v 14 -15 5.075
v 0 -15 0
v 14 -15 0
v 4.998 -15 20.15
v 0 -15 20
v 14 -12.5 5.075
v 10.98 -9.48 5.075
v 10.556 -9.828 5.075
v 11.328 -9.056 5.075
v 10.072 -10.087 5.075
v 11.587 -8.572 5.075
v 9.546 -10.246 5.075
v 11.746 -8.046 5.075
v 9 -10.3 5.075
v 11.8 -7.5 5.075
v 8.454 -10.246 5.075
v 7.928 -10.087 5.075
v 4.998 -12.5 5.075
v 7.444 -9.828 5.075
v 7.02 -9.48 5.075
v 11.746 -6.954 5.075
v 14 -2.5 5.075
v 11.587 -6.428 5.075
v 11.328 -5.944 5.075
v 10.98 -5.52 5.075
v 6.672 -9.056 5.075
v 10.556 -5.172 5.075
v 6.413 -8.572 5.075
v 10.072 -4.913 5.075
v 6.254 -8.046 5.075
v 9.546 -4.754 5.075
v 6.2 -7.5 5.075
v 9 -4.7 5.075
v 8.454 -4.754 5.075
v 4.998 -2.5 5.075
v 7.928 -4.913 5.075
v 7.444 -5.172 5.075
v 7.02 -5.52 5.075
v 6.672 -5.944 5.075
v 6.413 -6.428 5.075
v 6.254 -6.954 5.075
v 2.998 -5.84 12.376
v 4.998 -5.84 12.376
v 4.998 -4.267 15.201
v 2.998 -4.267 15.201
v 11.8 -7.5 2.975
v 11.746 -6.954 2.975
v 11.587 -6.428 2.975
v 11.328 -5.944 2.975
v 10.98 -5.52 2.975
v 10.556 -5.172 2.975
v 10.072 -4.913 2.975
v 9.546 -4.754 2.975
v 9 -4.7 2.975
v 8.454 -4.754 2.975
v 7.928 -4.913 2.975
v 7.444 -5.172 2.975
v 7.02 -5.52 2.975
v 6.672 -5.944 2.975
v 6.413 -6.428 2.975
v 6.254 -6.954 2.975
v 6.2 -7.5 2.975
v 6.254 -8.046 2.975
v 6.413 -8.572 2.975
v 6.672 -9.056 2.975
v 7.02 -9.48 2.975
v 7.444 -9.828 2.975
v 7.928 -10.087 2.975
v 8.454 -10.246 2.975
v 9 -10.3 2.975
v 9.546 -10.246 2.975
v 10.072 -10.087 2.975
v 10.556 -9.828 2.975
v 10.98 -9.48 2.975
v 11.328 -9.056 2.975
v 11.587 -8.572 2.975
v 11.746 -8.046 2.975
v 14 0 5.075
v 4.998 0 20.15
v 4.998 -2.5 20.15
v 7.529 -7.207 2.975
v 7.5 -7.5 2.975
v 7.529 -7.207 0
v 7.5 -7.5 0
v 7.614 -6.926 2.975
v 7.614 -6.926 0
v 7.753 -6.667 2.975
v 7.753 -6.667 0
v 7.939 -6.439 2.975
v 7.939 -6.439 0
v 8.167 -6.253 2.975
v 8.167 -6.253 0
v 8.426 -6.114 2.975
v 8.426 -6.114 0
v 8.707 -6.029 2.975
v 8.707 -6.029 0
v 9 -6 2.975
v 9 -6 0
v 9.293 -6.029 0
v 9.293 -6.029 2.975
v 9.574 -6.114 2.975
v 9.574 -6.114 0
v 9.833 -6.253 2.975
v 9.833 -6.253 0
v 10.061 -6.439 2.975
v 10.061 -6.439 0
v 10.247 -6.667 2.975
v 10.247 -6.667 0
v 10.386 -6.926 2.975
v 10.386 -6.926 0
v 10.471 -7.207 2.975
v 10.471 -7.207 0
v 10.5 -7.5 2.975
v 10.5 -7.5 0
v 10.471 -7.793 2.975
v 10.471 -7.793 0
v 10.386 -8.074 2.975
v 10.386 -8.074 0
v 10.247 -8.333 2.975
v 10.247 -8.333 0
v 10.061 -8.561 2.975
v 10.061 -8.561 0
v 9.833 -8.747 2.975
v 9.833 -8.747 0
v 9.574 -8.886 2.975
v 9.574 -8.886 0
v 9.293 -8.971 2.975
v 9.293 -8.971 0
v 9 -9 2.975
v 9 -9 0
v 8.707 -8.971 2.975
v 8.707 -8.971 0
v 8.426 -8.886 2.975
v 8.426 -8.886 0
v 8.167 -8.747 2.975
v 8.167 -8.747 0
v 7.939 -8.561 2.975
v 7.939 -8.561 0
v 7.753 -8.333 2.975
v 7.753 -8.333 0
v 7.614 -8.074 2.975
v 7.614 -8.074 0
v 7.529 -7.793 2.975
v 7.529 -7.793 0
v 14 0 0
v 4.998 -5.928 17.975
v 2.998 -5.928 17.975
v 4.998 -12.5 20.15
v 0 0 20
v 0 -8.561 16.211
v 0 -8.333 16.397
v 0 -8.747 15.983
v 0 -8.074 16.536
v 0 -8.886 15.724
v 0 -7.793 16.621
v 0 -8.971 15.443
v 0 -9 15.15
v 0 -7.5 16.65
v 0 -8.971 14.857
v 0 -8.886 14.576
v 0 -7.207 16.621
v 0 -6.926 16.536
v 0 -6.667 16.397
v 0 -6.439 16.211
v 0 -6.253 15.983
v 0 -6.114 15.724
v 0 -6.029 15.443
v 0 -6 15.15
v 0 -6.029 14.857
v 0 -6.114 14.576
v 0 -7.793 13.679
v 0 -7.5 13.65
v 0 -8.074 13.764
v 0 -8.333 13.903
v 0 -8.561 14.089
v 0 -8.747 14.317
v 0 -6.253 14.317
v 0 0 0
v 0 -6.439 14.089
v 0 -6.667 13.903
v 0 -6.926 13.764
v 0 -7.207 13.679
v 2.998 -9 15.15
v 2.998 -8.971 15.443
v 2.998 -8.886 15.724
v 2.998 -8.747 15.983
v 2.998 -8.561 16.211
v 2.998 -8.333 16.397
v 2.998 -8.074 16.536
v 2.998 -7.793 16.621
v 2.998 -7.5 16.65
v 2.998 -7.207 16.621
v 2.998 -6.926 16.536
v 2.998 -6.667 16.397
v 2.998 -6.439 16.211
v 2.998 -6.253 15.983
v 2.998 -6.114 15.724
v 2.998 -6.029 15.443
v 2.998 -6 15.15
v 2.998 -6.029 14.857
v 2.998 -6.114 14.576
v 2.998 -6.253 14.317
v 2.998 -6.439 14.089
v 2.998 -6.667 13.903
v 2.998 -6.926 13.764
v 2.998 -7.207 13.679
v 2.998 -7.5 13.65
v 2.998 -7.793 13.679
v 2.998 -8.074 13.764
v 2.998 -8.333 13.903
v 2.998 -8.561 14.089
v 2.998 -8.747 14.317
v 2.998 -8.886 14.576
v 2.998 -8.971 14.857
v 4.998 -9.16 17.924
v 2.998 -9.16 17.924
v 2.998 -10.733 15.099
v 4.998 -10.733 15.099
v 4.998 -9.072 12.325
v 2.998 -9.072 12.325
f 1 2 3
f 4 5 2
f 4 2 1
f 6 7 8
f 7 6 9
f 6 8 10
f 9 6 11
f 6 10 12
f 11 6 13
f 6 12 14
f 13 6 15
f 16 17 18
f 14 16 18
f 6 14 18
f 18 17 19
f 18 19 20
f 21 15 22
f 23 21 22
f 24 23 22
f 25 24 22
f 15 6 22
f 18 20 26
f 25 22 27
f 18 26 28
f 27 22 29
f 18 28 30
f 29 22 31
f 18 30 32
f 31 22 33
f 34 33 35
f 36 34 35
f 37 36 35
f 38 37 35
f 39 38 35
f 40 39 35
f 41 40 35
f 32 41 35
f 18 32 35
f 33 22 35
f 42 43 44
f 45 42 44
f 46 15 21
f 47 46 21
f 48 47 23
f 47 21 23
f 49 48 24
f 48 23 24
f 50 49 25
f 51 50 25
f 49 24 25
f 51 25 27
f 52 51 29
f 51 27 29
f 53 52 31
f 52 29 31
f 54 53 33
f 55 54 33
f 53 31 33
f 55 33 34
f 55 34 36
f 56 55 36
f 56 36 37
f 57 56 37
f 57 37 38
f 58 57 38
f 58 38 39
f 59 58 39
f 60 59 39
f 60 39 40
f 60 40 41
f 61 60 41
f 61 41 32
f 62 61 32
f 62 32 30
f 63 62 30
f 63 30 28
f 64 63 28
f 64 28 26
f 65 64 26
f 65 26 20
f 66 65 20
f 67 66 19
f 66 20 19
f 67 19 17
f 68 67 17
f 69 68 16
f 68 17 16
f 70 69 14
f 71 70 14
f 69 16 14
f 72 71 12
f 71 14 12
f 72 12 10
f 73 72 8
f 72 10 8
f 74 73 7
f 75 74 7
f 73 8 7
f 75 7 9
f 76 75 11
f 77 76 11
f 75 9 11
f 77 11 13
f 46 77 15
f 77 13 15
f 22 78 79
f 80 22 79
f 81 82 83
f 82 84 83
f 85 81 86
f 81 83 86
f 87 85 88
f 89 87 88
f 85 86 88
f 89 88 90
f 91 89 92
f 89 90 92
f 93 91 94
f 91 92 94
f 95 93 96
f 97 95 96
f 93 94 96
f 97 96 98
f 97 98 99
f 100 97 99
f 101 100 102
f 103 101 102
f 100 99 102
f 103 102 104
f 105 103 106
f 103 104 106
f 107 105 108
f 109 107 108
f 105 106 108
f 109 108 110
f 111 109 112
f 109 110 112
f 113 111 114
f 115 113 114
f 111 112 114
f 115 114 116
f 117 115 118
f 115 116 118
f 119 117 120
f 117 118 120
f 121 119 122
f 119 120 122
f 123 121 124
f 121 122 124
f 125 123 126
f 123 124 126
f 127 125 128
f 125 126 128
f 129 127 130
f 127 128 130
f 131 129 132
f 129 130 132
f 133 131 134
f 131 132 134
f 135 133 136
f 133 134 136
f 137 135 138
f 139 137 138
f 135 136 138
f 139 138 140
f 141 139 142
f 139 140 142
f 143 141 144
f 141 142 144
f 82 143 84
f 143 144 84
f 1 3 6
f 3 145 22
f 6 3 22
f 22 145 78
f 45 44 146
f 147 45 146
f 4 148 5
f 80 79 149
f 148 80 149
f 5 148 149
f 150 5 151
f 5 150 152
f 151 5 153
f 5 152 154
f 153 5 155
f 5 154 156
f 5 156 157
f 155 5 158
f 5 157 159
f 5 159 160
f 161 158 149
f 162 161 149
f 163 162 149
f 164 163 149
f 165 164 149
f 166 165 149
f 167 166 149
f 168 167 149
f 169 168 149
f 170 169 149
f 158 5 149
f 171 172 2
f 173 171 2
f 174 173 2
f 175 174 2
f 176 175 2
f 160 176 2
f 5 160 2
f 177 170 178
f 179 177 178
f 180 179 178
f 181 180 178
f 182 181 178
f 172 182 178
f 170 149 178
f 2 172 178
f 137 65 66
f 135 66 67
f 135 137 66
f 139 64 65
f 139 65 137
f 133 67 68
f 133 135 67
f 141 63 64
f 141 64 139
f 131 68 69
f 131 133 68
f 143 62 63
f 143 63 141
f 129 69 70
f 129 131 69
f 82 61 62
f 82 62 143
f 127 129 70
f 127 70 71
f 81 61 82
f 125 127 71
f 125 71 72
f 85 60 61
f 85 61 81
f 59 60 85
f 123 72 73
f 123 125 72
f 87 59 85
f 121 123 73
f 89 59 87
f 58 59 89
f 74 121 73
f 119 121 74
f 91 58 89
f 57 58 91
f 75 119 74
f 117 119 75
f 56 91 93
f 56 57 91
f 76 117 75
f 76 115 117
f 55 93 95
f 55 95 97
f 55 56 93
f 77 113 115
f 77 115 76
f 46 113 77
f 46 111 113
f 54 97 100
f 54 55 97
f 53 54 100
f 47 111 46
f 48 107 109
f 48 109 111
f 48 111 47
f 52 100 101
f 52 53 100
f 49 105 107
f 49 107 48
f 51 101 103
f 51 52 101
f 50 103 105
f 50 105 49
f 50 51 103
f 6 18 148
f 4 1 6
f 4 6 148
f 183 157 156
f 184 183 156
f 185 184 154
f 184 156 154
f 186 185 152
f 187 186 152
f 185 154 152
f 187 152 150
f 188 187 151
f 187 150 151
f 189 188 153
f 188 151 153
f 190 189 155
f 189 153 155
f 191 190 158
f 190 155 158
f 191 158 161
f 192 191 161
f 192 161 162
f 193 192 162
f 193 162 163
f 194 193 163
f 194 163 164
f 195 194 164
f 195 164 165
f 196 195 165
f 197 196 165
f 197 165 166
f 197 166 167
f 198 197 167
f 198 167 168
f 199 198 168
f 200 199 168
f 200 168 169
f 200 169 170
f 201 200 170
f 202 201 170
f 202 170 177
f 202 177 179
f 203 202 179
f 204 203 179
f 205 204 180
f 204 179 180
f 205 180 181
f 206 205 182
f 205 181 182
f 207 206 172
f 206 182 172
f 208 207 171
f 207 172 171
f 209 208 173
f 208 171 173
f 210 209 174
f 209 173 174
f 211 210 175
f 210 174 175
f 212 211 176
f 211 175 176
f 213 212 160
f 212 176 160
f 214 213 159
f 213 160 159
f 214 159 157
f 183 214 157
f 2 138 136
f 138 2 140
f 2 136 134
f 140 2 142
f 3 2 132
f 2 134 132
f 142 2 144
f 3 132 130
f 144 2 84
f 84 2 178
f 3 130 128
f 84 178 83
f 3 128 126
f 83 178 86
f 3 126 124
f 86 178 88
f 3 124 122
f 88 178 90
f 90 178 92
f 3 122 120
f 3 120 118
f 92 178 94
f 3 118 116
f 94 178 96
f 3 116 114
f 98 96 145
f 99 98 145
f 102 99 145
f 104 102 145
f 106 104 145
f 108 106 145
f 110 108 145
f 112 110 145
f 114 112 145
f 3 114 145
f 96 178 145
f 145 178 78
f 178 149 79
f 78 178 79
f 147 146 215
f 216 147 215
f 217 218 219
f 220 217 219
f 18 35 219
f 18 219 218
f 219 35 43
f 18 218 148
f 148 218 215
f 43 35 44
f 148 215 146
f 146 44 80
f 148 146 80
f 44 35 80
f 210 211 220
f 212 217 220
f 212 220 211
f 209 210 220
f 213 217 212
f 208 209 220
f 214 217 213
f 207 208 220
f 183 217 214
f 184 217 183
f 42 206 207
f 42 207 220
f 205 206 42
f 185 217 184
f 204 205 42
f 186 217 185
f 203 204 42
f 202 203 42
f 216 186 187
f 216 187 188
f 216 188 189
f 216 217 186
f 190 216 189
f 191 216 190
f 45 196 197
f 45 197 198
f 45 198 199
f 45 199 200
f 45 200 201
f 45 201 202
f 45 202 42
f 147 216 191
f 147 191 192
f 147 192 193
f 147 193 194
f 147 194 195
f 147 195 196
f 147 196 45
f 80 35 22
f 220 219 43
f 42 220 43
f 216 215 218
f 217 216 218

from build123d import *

# Parameters (mm, degrees)
F1_DEPTH       = 15
F2_DEPTH       = 2.5
F5_DEPTH       = 2.5
F7_D           = 3
F7_CBORE_D     = 5.6
F7_CBORE_DEPTH = 2.1
F9_D           = 3
F10_DEPTH      = 2


with BuildPart() as f1:
    # F0 (on Front) → F1 (new body)
    with BuildSketch(Plane.XZ):
        Polygon((4.9977494935, 20.15), (0, 20), (0, 0), (14, 0), (14, 5.075), (4.9977494935, 5.075), align=None)
    extrude(amount=F1_DEPTH)

    # F0 (on Front) → F2 (join)
    with BuildSketch(Plane.XZ):
        Polygon((4.9977494935, 20.15), (0, 20), (0, 0), (14, 0), (14, 5.075), (4.9977494935, 5.075), align=None)
        Polygon((14, 5.075), (4.9977494935, 20.15), (4.9977494935, 5.075), align=None)
    extrude(amount=F2_DEPTH)

    # F4 (on offset) → F5 (join)
    with BuildSketch(Plane.XZ.offset(15)):
        Polygon((14, 5.075), (4.9977494935, 20.15), (4.9977494935, 5.075), align=None)
    extrude(amount=-F5_DEPTH)

    # F7 (through all)
    with Locations(Plane.XY.offset(5.075)):
        with Locations((9, -7.5)):
            CounterBoreHole(F7_D / 2, F7_CBORE_D / 2, F7_CBORE_DEPTH)

    # F9 (through all)
    with Locations(Plane.YZ.offset(4.9977494935)):
        with Locations((-7.5, 15.15)):
            Hole(F9_D / 2)

    # F8 (on face) → F10 (cut)
    with BuildSketch(Plane.YZ.offset(4.9977494935)):
        Polygon((-9.1603395536, 17.9242757433), (-10.7327630476, 15.0992416393), (-9.072423494, 12.324965896), (-5.8396604464, 12.3757242567), (-4.2672369524, 15.2007583607), (-5.927576506, 17.975034104), align=None)
    extrude(amount=-F10_DEPTH, mode=Mode.SUBTRACT)


solid = f1.part
